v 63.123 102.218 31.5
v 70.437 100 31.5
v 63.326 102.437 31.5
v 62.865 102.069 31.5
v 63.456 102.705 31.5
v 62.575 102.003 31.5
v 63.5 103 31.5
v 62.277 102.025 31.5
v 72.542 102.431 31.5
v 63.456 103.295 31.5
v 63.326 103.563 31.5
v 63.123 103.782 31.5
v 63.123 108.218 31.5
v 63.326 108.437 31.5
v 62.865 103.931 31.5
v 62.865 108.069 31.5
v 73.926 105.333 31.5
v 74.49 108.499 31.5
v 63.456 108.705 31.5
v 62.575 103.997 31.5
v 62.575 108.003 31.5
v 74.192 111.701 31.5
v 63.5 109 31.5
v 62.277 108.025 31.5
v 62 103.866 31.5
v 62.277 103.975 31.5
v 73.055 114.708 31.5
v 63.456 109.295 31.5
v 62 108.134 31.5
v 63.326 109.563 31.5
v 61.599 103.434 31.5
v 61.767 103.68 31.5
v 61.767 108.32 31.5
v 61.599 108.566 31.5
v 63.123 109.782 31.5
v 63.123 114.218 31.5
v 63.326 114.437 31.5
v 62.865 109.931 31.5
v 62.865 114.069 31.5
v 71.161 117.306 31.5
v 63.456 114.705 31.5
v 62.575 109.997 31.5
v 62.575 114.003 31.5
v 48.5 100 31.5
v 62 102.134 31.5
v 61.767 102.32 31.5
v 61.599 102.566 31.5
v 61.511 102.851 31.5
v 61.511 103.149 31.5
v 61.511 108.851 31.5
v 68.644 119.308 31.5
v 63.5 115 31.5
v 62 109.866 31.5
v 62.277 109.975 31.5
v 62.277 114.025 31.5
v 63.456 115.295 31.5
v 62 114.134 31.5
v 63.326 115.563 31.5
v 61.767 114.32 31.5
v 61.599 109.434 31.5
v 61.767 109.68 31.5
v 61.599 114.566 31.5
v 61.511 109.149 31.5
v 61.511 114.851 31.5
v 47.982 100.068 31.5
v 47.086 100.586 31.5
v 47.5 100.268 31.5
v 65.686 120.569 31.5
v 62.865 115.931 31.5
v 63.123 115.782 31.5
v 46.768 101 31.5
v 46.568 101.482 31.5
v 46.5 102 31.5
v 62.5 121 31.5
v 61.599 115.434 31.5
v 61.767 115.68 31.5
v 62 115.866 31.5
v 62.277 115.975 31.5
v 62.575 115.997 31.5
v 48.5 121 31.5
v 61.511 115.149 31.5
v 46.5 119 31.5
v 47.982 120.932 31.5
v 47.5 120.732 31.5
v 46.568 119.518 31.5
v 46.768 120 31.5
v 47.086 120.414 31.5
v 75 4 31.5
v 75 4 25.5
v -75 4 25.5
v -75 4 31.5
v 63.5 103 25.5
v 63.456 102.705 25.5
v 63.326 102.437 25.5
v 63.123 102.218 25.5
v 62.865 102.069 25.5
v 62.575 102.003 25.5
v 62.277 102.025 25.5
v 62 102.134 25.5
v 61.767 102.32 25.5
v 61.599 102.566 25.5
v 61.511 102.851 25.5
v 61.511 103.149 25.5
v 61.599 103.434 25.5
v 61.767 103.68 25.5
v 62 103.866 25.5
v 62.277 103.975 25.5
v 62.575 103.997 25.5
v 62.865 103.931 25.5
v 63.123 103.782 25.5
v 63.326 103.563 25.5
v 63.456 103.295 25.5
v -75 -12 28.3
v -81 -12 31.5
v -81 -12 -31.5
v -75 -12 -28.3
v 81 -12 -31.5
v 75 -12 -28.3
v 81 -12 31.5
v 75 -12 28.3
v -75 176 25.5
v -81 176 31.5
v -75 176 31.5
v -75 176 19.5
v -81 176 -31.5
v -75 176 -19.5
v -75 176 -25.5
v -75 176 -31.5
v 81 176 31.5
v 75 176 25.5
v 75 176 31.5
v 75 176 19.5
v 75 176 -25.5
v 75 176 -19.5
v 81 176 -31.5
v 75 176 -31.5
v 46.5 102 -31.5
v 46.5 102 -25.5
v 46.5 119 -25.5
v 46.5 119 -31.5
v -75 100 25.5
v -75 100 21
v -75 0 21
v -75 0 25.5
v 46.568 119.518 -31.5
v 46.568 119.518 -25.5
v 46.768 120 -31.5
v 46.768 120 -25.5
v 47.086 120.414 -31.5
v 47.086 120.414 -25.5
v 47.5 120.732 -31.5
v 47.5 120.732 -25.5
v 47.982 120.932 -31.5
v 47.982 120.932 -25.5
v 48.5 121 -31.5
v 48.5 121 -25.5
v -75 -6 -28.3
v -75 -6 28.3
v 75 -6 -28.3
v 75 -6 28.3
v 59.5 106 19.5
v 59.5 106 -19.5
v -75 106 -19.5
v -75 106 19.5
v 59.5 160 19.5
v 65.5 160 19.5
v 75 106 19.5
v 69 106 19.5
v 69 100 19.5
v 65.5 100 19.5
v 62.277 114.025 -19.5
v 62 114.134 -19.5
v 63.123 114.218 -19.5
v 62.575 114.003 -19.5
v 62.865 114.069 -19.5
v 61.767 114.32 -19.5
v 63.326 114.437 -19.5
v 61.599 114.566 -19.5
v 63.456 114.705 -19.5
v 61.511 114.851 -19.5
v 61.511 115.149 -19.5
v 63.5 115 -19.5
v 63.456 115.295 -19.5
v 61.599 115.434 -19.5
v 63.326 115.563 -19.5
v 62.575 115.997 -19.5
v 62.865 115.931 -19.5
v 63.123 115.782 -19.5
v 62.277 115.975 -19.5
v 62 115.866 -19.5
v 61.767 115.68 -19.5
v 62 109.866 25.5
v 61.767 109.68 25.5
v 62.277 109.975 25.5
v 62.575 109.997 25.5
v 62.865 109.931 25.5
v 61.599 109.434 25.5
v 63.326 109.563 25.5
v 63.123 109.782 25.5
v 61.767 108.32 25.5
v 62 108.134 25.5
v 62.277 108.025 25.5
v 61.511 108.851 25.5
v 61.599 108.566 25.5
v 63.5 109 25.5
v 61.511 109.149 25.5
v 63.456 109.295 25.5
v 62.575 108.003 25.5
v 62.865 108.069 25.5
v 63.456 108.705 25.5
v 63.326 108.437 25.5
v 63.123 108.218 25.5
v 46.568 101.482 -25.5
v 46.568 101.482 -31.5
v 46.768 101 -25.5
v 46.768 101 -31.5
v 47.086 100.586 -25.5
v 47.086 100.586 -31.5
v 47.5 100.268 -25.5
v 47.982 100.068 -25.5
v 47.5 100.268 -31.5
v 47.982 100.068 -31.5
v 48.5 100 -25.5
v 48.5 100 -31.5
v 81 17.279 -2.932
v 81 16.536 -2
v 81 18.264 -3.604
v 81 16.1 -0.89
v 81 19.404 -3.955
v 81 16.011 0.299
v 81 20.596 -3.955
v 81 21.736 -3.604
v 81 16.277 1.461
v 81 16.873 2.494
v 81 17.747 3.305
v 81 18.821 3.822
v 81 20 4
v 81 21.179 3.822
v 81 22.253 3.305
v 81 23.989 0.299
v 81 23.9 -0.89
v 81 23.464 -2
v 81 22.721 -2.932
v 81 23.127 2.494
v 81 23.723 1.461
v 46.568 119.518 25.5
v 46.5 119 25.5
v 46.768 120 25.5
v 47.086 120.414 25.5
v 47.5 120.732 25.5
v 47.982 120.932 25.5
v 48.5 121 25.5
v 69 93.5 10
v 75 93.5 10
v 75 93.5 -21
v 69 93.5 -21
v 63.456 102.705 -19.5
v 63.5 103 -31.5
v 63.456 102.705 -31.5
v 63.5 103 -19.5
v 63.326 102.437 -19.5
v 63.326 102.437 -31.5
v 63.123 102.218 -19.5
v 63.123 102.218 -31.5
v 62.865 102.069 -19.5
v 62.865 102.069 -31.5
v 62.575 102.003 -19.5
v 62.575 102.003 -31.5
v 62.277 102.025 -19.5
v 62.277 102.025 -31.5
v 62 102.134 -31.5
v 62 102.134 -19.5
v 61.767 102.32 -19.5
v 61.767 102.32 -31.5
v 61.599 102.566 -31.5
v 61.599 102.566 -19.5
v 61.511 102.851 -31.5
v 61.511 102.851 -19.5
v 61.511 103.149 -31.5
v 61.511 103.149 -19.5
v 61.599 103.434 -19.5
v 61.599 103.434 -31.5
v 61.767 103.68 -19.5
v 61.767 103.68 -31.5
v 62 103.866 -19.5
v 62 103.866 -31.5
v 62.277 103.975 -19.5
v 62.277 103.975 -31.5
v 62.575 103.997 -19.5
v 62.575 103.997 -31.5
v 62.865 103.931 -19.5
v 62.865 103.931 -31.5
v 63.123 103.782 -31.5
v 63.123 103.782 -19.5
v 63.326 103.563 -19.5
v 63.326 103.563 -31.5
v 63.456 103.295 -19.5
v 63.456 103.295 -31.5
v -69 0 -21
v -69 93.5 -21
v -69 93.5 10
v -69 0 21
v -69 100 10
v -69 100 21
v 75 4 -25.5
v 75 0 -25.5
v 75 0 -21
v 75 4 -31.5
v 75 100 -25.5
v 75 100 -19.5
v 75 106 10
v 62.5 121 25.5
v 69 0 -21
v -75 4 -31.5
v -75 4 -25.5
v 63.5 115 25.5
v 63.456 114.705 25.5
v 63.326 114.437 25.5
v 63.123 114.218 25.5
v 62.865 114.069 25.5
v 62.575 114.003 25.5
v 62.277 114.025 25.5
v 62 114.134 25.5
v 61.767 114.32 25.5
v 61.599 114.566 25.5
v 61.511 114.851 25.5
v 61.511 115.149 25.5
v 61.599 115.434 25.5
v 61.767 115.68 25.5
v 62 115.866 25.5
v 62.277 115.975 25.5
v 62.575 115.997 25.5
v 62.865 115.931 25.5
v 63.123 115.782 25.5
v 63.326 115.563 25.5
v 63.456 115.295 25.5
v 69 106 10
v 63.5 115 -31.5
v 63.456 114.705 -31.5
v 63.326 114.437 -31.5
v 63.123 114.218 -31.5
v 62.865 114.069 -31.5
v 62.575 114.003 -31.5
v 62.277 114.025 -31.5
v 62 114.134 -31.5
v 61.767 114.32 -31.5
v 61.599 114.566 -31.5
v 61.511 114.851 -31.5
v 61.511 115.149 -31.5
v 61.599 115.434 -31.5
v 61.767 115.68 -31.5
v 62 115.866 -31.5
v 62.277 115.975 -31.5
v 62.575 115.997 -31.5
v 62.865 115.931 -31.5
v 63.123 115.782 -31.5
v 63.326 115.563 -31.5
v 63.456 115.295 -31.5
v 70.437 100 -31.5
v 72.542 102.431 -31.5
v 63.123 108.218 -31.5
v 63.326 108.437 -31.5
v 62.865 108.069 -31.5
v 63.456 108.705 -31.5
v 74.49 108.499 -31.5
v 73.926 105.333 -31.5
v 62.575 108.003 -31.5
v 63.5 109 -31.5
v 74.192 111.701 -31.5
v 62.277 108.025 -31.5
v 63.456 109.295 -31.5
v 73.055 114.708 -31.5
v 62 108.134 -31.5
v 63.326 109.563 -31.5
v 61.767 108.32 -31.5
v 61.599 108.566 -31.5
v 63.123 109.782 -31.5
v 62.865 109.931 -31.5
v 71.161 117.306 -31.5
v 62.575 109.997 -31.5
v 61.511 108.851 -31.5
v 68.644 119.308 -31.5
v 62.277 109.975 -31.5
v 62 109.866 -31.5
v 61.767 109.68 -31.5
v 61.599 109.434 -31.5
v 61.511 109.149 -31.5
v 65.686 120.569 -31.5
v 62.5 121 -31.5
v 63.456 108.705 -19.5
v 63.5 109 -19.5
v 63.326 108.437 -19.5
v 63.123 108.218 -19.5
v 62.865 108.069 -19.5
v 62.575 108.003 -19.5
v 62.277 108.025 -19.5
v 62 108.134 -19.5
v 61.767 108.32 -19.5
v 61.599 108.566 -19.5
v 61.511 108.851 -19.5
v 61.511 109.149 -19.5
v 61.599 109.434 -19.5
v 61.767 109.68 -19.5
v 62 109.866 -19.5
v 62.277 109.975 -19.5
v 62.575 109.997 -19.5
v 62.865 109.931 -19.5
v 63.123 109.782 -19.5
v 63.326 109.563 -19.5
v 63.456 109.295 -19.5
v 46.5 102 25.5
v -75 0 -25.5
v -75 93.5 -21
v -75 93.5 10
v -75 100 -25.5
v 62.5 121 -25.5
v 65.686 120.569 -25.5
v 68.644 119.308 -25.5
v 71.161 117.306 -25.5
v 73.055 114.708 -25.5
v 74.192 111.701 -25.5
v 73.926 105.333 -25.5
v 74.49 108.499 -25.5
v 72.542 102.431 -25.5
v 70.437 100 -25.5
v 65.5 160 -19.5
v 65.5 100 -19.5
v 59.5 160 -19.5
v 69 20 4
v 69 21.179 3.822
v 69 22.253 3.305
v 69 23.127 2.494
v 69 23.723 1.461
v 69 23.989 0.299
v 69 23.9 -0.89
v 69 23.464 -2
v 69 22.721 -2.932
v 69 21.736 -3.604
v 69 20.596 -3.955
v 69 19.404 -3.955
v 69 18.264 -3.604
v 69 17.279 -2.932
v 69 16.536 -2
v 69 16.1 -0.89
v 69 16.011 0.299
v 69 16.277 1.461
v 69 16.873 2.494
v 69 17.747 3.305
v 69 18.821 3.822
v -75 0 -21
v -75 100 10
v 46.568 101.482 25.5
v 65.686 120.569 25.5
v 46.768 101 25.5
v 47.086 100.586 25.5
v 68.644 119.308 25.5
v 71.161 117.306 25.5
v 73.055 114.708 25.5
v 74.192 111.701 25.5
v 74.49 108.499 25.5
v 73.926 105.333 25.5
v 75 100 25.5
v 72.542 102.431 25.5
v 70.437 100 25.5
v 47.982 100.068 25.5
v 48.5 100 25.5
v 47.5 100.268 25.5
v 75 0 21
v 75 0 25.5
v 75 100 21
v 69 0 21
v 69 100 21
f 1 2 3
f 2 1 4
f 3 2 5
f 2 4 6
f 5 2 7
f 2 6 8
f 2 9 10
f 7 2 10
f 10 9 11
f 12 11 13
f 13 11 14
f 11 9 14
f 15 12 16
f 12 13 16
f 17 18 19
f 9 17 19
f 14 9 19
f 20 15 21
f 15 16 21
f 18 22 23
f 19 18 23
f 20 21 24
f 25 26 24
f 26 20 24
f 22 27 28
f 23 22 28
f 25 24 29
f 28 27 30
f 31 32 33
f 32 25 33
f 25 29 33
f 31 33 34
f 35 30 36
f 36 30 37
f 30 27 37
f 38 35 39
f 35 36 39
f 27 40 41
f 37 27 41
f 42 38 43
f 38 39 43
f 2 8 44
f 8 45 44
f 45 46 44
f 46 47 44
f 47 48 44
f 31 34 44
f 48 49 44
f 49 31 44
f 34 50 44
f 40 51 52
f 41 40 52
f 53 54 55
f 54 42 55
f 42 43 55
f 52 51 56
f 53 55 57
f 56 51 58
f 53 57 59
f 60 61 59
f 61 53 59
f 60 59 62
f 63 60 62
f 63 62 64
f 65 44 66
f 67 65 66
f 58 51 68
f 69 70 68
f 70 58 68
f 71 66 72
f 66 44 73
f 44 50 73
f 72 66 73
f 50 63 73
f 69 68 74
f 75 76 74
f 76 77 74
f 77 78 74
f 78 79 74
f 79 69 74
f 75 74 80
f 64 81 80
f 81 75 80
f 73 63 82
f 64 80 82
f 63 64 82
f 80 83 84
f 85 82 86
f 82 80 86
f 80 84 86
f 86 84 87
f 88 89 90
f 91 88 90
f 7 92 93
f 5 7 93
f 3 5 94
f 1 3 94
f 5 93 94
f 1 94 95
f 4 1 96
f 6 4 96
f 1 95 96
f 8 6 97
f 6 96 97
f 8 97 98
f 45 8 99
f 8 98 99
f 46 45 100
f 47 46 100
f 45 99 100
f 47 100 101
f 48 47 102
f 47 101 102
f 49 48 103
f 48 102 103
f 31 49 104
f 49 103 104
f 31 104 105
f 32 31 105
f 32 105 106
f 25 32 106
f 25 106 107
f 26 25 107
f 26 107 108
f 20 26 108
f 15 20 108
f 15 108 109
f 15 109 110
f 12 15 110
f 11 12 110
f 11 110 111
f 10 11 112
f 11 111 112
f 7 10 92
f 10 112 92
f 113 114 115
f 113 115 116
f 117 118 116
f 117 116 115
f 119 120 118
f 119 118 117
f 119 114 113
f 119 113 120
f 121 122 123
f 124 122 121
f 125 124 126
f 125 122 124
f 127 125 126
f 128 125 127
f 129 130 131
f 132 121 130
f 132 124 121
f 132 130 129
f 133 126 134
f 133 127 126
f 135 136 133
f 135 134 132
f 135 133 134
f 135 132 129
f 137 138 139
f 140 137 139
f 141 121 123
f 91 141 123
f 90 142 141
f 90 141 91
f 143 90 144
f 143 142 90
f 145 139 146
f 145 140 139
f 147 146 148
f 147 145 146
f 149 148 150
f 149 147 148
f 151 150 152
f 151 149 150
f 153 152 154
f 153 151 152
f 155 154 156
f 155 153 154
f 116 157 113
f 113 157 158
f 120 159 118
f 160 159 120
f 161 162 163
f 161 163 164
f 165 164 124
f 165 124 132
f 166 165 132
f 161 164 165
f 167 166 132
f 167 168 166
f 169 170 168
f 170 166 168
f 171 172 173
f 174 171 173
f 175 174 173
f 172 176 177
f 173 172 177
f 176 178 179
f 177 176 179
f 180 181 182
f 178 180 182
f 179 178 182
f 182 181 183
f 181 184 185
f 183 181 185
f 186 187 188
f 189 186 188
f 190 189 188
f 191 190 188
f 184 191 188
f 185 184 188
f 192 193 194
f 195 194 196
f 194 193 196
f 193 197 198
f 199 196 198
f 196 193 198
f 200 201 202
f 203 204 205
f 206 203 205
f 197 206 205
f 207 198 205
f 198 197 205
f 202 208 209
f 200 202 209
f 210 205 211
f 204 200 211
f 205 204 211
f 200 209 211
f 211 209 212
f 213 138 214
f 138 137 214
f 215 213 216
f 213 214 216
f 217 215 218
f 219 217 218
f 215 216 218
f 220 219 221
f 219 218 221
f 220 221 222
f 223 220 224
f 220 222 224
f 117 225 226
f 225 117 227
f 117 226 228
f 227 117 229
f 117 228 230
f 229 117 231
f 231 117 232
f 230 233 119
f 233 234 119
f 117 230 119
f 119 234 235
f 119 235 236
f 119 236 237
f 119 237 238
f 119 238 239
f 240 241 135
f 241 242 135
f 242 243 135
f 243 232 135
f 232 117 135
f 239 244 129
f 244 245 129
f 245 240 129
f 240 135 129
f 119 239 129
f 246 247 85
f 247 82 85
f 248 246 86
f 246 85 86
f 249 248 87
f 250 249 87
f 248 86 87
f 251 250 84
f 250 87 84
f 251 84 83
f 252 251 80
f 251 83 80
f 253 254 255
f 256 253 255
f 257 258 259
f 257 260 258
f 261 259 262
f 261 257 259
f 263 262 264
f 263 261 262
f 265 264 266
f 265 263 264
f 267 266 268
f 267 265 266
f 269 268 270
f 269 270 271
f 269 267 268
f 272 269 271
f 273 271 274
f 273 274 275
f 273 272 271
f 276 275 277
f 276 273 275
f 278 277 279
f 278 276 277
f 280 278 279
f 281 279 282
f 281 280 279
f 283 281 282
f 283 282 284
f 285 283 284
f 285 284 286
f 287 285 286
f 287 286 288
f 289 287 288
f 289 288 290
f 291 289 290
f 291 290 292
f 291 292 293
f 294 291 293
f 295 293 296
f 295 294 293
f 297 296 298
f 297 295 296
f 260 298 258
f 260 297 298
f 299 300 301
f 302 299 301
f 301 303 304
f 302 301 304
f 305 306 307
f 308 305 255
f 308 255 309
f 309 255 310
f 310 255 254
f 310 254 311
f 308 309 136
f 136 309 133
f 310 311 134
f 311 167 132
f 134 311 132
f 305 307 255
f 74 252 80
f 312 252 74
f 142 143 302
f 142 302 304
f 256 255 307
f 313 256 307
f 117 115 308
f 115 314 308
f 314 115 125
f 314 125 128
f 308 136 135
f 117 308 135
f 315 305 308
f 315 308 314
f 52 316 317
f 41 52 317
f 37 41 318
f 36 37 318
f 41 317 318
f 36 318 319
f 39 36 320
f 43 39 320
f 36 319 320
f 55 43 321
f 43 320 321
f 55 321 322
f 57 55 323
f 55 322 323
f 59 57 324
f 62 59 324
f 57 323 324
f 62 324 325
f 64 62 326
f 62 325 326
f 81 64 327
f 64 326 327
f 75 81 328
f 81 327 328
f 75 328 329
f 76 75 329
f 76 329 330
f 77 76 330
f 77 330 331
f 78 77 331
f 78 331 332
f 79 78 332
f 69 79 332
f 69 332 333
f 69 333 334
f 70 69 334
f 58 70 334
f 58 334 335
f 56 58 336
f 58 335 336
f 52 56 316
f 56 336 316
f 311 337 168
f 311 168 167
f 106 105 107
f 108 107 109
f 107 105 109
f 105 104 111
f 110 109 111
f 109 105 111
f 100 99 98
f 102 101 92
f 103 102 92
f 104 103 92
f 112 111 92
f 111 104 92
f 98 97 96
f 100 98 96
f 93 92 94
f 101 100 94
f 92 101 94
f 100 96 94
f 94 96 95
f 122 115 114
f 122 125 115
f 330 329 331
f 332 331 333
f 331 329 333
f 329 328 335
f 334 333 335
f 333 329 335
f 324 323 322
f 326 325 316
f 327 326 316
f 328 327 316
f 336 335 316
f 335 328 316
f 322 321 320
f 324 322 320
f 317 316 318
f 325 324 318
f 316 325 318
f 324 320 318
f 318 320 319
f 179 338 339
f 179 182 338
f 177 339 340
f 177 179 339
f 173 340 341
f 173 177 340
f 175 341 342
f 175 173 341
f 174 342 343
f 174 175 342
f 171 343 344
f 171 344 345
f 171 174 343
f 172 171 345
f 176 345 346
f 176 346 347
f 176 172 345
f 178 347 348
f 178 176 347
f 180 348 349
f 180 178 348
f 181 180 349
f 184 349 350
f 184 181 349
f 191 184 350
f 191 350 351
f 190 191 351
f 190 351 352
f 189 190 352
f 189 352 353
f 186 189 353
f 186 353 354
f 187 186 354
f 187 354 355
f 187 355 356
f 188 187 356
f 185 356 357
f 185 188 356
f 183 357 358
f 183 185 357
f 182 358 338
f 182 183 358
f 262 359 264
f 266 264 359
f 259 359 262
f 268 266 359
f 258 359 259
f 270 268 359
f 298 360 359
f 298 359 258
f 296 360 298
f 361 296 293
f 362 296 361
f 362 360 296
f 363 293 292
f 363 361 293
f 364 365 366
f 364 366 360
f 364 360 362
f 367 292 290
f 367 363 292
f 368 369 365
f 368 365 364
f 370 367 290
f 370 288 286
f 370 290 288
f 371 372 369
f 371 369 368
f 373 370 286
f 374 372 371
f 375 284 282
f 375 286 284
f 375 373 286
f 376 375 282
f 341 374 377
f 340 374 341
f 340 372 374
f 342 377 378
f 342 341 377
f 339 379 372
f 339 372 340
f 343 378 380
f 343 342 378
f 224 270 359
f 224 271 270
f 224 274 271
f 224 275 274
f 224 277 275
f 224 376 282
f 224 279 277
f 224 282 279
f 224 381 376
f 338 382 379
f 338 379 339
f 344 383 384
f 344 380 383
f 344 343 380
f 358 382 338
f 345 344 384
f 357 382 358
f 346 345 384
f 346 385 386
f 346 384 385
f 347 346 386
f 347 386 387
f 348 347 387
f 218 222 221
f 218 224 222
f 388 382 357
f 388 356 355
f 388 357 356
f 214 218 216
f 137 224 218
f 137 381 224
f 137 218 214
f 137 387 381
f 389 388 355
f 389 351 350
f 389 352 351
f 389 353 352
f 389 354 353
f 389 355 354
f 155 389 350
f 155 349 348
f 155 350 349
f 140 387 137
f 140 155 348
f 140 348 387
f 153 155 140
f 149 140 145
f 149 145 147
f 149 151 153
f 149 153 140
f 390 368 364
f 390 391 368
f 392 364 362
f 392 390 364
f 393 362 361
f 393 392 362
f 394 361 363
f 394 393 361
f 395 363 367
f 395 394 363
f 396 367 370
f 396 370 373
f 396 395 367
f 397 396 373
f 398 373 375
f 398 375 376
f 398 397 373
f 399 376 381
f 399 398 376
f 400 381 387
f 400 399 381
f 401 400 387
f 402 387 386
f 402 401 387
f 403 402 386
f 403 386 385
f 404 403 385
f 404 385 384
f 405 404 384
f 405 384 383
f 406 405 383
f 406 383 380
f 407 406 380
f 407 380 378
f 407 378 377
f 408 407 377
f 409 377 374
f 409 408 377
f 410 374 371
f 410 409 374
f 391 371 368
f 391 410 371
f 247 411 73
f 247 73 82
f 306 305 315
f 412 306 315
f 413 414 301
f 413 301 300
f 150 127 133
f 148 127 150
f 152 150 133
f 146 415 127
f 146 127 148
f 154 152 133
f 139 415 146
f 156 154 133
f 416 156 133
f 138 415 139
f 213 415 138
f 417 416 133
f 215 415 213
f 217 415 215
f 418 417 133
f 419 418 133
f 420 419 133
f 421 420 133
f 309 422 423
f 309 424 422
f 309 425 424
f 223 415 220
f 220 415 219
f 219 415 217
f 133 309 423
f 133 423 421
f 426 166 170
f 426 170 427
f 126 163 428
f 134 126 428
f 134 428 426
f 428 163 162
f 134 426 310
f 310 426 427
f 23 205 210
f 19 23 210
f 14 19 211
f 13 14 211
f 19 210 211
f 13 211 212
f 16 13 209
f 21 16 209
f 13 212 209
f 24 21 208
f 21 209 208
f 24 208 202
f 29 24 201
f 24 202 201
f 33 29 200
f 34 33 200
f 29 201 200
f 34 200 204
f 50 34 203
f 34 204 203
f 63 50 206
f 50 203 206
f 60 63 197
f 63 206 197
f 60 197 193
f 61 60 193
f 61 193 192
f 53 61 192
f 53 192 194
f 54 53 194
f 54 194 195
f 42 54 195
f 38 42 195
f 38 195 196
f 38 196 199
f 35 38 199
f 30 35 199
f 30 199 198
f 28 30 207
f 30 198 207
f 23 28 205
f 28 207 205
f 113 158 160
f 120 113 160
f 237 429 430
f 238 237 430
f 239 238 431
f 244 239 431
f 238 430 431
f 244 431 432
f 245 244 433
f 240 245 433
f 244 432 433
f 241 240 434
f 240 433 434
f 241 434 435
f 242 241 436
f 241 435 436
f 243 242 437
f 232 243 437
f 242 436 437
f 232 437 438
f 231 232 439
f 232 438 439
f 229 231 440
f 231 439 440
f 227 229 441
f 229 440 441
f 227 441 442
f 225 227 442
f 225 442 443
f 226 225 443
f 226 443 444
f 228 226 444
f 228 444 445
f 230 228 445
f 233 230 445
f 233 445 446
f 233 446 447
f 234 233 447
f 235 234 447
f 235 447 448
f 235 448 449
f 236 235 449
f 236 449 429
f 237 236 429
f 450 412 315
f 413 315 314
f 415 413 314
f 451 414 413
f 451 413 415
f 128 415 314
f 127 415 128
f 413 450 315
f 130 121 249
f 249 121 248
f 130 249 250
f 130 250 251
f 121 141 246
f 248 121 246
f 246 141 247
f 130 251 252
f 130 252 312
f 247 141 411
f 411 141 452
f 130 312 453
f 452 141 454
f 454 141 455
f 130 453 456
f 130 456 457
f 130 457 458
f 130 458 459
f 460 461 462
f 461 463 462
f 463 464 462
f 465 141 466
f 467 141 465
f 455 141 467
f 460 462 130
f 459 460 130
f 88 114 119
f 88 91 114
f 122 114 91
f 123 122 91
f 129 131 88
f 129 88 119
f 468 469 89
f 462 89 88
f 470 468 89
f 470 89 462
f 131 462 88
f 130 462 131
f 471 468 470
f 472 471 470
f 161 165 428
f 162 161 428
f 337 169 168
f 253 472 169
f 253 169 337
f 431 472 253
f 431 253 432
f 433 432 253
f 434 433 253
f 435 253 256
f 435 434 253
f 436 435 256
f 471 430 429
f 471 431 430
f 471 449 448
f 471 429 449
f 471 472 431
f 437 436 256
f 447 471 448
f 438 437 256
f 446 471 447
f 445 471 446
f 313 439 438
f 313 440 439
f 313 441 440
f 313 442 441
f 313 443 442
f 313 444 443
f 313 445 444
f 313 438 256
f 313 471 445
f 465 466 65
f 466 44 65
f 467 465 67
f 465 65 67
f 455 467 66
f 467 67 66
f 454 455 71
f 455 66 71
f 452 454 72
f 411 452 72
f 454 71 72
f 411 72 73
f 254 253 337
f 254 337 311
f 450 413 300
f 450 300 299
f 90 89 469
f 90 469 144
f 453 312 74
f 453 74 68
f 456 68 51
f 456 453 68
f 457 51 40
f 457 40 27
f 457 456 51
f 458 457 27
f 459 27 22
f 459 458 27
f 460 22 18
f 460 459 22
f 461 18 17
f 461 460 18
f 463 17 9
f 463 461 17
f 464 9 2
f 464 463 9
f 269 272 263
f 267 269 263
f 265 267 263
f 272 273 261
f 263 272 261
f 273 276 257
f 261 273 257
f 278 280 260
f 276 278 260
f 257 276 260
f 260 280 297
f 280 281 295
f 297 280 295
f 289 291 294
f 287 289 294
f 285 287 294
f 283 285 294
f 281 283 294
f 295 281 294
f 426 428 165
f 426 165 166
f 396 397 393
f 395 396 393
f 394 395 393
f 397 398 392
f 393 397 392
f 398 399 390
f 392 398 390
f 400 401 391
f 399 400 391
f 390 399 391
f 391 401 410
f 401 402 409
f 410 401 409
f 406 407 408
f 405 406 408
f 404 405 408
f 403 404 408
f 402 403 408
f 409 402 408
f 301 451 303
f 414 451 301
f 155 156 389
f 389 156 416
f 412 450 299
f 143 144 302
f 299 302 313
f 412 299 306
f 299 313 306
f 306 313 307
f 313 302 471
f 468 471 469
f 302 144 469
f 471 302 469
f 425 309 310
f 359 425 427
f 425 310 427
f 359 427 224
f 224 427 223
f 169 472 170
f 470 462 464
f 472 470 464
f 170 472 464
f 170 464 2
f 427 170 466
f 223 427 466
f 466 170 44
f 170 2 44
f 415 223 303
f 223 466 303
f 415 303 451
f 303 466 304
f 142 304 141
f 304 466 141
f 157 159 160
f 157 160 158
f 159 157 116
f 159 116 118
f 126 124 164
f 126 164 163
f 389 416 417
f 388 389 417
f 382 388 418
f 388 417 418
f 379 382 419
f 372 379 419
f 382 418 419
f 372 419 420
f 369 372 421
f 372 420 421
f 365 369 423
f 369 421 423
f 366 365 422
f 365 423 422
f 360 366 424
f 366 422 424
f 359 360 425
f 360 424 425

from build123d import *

# Parameters (mm, degrees)
SKETCH1_W            = 150
SKETCH1_H            = 42
BOSS_EXTRUDE1_DEPTH  = 3.2
SKETCH2_W            = 162
SKETCH2_H            = 51
BOSS_EXTRUDE2_DEPTH  = 6
SKETCH3_W            = 6
SKETCH3_H            = 51
BOSS_EXTRUDE3_DEPTH  = 176
BOSS_EXTRUDE4_REACH  = 238.563
SKETCH5_W            = 51
SKETCH5_H            = 6
BOSS_EXTRUDE5_START  = 100
SKETCH1_2_W          = 150
SKETCH1_2_H          = 42
BOSS_EXTRUDE5_DEPTH  = 3.2
SKETCH6_W            = 150
SKETCH6_H            = 6
BOSS_EXTRUDE6_DEPTH  = 70
CUT_EXTRUDE1_REACH   = 142.553
SKETCH7_W            = 9.5
SKETCH7_H            = 39
SKETCH7_R            = 2.75
SKETCH7_3_W          = 6
SKETCH7_3_H          = 39
BOSS_EXTRUDE7_DEPTH  = 54
SKETCH8_W            = 162
SKETCH8_H            = 10
BOSS_EXTRUDE8_DEPTH  = 6
SKETCH9_W            = 150
SKETCH9_H            = 42
CUT_EXTRUDE2_DEPTH   = 3.2
CUT_EXTRUDE3_DEPTH   = 3.2
BOSS_EXTRUDE9_DEPTH  = 6
SKETCH12_W           = 6
SKETCH12_H           = 9.5
BOSS_EXTRUDE10_DEPTH = 6
CUT_EXTRUDE4_REACH   = 235.384
SKETCH13_R           = 4
CUT_EXTRUDE5_REACH   = 202.345
SKETCH14_R           = 1
SKETCH16_W           = 6
SKETCH16_H           = 172
BOSS_EXTRUDE11_DEPTH = 6
BOSS_EXTRUDE15_START = -51
BOSS_EXTRUDE15_DEPTH = 6
SKETCH17_W           = 162
SKETCH17_H           = 63
SKETCH17_W_2         = 150
SKETCH17_H_2         = 56.6
BOSS_EXTRUDE12_DEPTH = 6
SKETCH15_R           = 1
BOSS_EXTRUDE14_DEPTH = 6
FILLET1_R            = 2
FILLET1_OF_MIRROR4_R = 2


with BuildPart() as part:
    # Sketch1 → Boss-Extrude1 (new body)
    with BuildSketch(Plane(origin=(0, 0, 0), x_dir=(1, 0, 0), z_dir=(0, 1, 0))):
        Rectangle(SKETCH1_W, SKETCH1_H)
    extrude(amount=BOSS_EXTRUDE1_DEPTH)

    # Sketch2 → Boss-Extrude2 (add)
    with BuildSketch(Plane.XZ):
        Rectangle(SKETCH2_W, SKETCH2_H)
    extrude(amount=BOSS_EXTRUDE2_DEPTH)

    # Sketch3 → Boss-Extrude3 (add)
    with BuildSketch(Plane(origin=(0, 0, 0), x_dir=(1, 0, 0), z_dir=(0, 1, 0))):
        with Locations((78, 0)):
            Rectangle(SKETCH3_W, SKETCH3_H)
        with Locations((-78, 0)):
            Rectangle(SKETCH3_W, SKETCH3_H)
    extrude(amount=BOSS_EXTRUDE3_DEPTH)

    # Sketch5 → Boss-Extrude4 (add, up to next)
    with BuildSketch(Plane.ZY.offset(-75), mode=Mode.PRIVATE) as boss_extrude4_sk1:
        with Locations((0, 103)):
            Rectangle(SKETCH5_W, SKETCH5_H)
    boss_extrude4_tool1 = extrude(boss_extrude4_sk1.sketch, amount=BOSS_EXTRUDE4_REACH, mode=Mode.PRIVATE) - part.part
    add(boss_extrude4_tool1.solids().sort_by_distance((75, 103, 0))[0])

    # Sketch1<2> → Boss-Extrude5 (add)
    with BuildSketch(Plane(origin=(0, 0, 0), x_dir=(1, 0, 0), z_dir=(0, 1, 0)).offset(BOSS_EXTRUDE5_START)):
        Rectangle(SKETCH1_2_W, SKETCH1_2_H)
    extrude(amount=-BOSS_EXTRUDE5_DEPTH)

    # Sketch6 → Boss-Extrude6 (add)
    with BuildSketch(Plane(origin=(0, 106, 0), x_dir=(1, 0, 0), z_dir=(0, 1, 0))):
        with Locations((0, -22.5)):
            Rectangle(SKETCH6_W, SKETCH6_H)
        with Locations((0, 22.5)):
            Rectangle(SKETCH6_W, SKETCH6_H)
    extrude(amount=BOSS_EXTRUDE6_DEPTH)

    # Sketch7 → Cut-Extrude1 (cut, up to next)
    with BuildSketch(Plane(origin=(0, 106, 0), x_dir=(1, 0, 0), z_dir=(0, 1, 0)), mode=Mode.PRIVATE) as cut_extrude1_sk1:
        with Locations((70.25, 0)):
            Rectangle(SKETCH7_W, SKETCH7_H)
        with Locations((70.25, -14.75)):
            Circle(SKETCH7_R, mode=Mode.SUBTRACT)
        with Locations((70.25, 14.75)):
            Circle(SKETCH7_R, mode=Mode.SUBTRACT)
    cut_extrude1_tool1 = extrude(cut_extrude1_sk1.sketch, amount=-CUT_EXTRUDE1_REACH, mode=Mode.PRIVATE) & part.part
    # Sketch7 → Cut-Extrude1 (cut, up to next)
    with BuildSketch(Plane(origin=(0, 106, 0), x_dir=(1, 0, 0), z_dir=(0, 1, 0)), mode=Mode.PRIVATE) as cut_extrude1_sk2:
        with Locations((70.25, -14.75)):
            Circle(SKETCH7_R)
    cut_extrude1_tool2 = extrude(cut_extrude1_sk2.sketch, amount=-CUT_EXTRUDE1_REACH, mode=Mode.PRIVATE) & part.part
    # Sketch7 → Cut-Extrude1 (cut, up to next)
    with BuildSketch(Plane(origin=(0, 106, 0), x_dir=(1, 0, 0), z_dir=(0, 1, 0)), mode=Mode.PRIVATE) as cut_extrude1_sk3:
        with Locations((70.25, 14.75)):
            Circle(SKETCH7_R)
    cut_extrude1_tool3 = extrude(cut_extrude1_sk3.sketch, amount=-CUT_EXTRUDE1_REACH, mode=Mode.PRIVATE) & part.part
    add(cut_extrude1_tool1.solids().sort_by_distance((70.25, 106, 0))[0], mode=Mode.SUBTRACT)
    add(cut_extrude1_tool2.solids().sort_by_distance((70.25, 106, 14.75))[0], mode=Mode.SUBTRACT)
    add(cut_extrude1_tool3.solids().sort_by_distance((70.25, 106, -14.75))[0], mode=Mode.SUBTRACT)

    # Sketch7<3> → Boss-Extrude7 (add)
    with BuildSketch(Plane(origin=(0, 106, 0), x_dir=(1, 0, 0), z_dir=(0, 1, 0))):
        with Locations((62.5, 0)):
            Rectangle(SKETCH7_3_W, SKETCH7_3_H)
    extrude(amount=BOSS_EXTRUDE7_DEPTH)

    # Sketch8 → Boss-Extrude8 (add)
    with BuildSketch(Plane(origin=(0, 0, -25.5), x_dir=(-1, 0, 0), z_dir=(0, 0, -1))):
        with Locations((0, -1)):
            Rectangle(SKETCH8_W, SKETCH8_H)
    boss_extrude8 = extrude(amount=BOSS_EXTRUDE8_DEPTH)

    # Mirror1: Boss-Extrude8 across plane
    add(boss_extrude8.mirror(Plane.XY))

    # Sketch9 → Cut-Extrude2 (cut)
    with BuildSketch(Plane(origin=(0, 3.2, 0), x_dir=(1, 0, 0), z_dir=(0, 1, 0))):
        Rectangle(SKETCH9_W, SKETCH9_H)
    extrude(amount=-CUT_EXTRUDE2_DEPTH, mode=Mode.SUBTRACT)

    # Sketch10 → Cut-Extrude3 (cut)
    with BuildSketch(Plane.XZ.offset(-96.8)):
        Polygon((-75, -21), (75, -21), (75, -19.5), (65.5, -19.5), (65.5, 19.5), (75, 19.5), (75, 21), (-75, 21), align=None)
    extrude(amount=-CUT_EXTRUDE3_DEPTH, mode=Mode.SUBTRACT)

    # Sketch11 → Boss-Extrude9 (add)
    with BuildSketch(Plane.ZY.offset(-75)):
        Polygon((10, 93.5), (-21, 93.5), (-21, 0), (21, 0), (21, 100), (10, 100), align=None)
    boss_extrude9 = extrude(amount=BOSS_EXTRUDE9_DEPTH)

    # Mirror2: Boss-Extrude9 across plane
    add(boss_extrude9.mirror(Plane(origin=(0, 0, 0), x_dir=(0, 0, 1), z_dir=(1, 0, 0))))

    # Sketch12 → Boss-Extrude10 (add)
    with BuildSketch(Plane(origin=(0, 100, 0), x_dir=(1, 0, 0), z_dir=(0, 1, 0))):
        with Locations((72, -14.75)):
            Rectangle(SKETCH12_W, SKETCH12_H)
    extrude(amount=BOSS_EXTRUDE10_DEPTH)

    # Sketch13 → Cut-Extrude4 (cut, up to next)
    with BuildSketch(Plane.ZY.offset(-69), mode=Mode.PRIVATE) as cut_extrude4_sk1:
        with Locations((0, 20)):
            Circle(SKETCH13_R)
    cut_extrude4_tool1 = extrude(cut_extrude4_sk1.sketch, amount=-CUT_EXTRUDE4_REACH, mode=Mode.PRIVATE) & part.part
    add(cut_extrude4_tool1.solids().sort_by_distance((69, 20, 0))[0], mode=Mode.SUBTRACT)

    # Sketch14 → Cut-Extrude5 (cut, up to next)
    with BuildSketch(Plane.XY.offset(-19.5), mode=Mode.PRIVATE) as cut_extrude5_sk1:
        with Locations((62.5, 103)):
            Circle(SKETCH14_R)
    cut_extrude5_tool1 = extrude(cut_extrude5_sk1.sketch, amount=-CUT_EXTRUDE5_REACH, mode=Mode.PRIVATE) & part.part
    # Sketch14 → Cut-Extrude5 (cut, up to next)
    with BuildSketch(Plane.XY.offset(-19.5), mode=Mode.PRIVATE) as cut_extrude5_sk2:
        with Locations((62.5, 109)):
            Circle(SKETCH14_R)
    cut_extrude5_tool2 = extrude(cut_extrude5_sk2.sketch, amount=-CUT_EXTRUDE5_REACH, mode=Mode.PRIVATE) & part.part
    # Sketch14 → Cut-Extrude5 (cut, up to next)
    with BuildSketch(Plane.XY.offset(-19.5), mode=Mode.PRIVATE) as cut_extrude5_sk3:
        with Locations((62.5, 115)):
            Circle(SKETCH14_R)
    cut_extrude5_tool3 = extrude(cut_extrude5_sk3.sketch, amount=-CUT_EXTRUDE5_REACH, mode=Mode.PRIVATE) & part.part
    add(cut_extrude5_tool1.solids().sort_by_distance((62.5, 103, -19.5))[0], mode=Mode.SUBTRACT)
    add(cut_extrude5_tool2.solids().sort_by_distance((62.5, 109, -19.5))[0], mode=Mode.SUBTRACT)
    add(cut_extrude5_tool3.solids().sort_by_distance((62.5, 115, -19.5))[0], mode=Mode.SUBTRACT)

    # Sketch16 → Boss-Extrude11 (add)
    with BuildSketch(Plane(origin=(0, 0, -25.5), x_dir=(-1, 0, 0), z_dir=(0, 0, -1))):
        with Locations((78, 90)):
            Rectangle(SKETCH16_W, SKETCH16_H)
        with Locations((-78, 90)):
            Rectangle(SKETCH16_W, SKETCH16_H)
    extrude(amount=BOSS_EXTRUDE11_DEPTH)

    # Sketch16<2> → Boss-Extrude15 (add)
    with BuildSketch(Plane(origin=(0, 0, -25.5), x_dir=(-1, 0, 0), z_dir=(0, 0, -1)).offset(BOSS_EXTRUDE15_START)):
        Polygon((75, 100), (75, 4), (81, 4), (81, 176), (75, 176), align=None)
        Polygon((-75, 4), (-75, 100), (-75, 176), (-81, 176), (-81, 4), align=None)
    extrude(amount=-BOSS_EXTRUDE15_DEPTH)

    # Sketch17 → Boss-Extrude12 (add)
    with BuildSketch(Plane.XZ.offset(6)):
        Rectangle(SKETCH17_W, SKETCH17_H)
        Rectangle(SKETCH17_W_2, SKETCH17_H_2, mode=Mode.SUBTRACT)
    extrude(amount=BOSS_EXTRUDE12_DEPTH)

    # Sketch15 → Boss-Extrude14 (add)
    with BuildSketch(Plane(origin=(0, 0, -25.5), x_dir=(-1, 0, 0), z_dir=(0, 0, -1))):
        with BuildLine():
            ThreePointArc((-62.5, 121), (-51.27502784, 113.242640687), (-54.562746067, 100))
            Line((-54.562746067, 100), (-46.5, 100))
            Line((-46.5, 100), (-46.5, 121))
            Line((-46.5, 121), (-62.5, 121))
        make_face()
        with BuildLine():
            ThreePointArc((-62.5, 121), (-73.72497216, 113.242640687), (-70.437253933, 100))
            Line((-70.437253933, 100), (-54.562746067, 100))
            ThreePointArc((-54.562746067, 100), (-51.27502784, 113.242640687), (-62.5, 121))
        make_face()
        with Locations(Location((-62.5, 103, 0), (0, 0, 180))):
            Circle(SKETCH15_R, mode=Mode.SUBTRACT)
        with Locations(Location((-62.5, 109, 0), (0, 0, 180))):
            Circle(SKETCH15_R, mode=Mode.SUBTRACT)
        with Locations(Location((-62.5, 115, 0), (0, 0, 180))):
            Circle(SKETCH15_R, mode=Mode.SUBTRACT)
    boss_extrude14 = extrude(amount=BOSS_EXTRUDE14_DEPTH)

    # Fillet1
    fillet1_edges = [part.edges().sort_by_distance(p)[0] for p in [
        (46.5, 121, -28.5),
        (46.5, 100, -28.5),
    ]]
    fillet(fillet1_edges, radius=FILLET1_R)

    # Mirror4: Boss-Extrude14 across plane
    add(boss_extrude14.mirror(Plane.XY))

    # Fillet1 of Mirror4
    fillet1_of_mirror4_edges = [part.edges().sort_by_distance(p)[0] for p in [
        (46.5, 121, 28.5),
        (46.5, 100, 28.5),
    ]]
    fillet(fillet1_of_mirror4_edges, radius=FILLET1_OF_MIRROR4_R)


solid = part.part
